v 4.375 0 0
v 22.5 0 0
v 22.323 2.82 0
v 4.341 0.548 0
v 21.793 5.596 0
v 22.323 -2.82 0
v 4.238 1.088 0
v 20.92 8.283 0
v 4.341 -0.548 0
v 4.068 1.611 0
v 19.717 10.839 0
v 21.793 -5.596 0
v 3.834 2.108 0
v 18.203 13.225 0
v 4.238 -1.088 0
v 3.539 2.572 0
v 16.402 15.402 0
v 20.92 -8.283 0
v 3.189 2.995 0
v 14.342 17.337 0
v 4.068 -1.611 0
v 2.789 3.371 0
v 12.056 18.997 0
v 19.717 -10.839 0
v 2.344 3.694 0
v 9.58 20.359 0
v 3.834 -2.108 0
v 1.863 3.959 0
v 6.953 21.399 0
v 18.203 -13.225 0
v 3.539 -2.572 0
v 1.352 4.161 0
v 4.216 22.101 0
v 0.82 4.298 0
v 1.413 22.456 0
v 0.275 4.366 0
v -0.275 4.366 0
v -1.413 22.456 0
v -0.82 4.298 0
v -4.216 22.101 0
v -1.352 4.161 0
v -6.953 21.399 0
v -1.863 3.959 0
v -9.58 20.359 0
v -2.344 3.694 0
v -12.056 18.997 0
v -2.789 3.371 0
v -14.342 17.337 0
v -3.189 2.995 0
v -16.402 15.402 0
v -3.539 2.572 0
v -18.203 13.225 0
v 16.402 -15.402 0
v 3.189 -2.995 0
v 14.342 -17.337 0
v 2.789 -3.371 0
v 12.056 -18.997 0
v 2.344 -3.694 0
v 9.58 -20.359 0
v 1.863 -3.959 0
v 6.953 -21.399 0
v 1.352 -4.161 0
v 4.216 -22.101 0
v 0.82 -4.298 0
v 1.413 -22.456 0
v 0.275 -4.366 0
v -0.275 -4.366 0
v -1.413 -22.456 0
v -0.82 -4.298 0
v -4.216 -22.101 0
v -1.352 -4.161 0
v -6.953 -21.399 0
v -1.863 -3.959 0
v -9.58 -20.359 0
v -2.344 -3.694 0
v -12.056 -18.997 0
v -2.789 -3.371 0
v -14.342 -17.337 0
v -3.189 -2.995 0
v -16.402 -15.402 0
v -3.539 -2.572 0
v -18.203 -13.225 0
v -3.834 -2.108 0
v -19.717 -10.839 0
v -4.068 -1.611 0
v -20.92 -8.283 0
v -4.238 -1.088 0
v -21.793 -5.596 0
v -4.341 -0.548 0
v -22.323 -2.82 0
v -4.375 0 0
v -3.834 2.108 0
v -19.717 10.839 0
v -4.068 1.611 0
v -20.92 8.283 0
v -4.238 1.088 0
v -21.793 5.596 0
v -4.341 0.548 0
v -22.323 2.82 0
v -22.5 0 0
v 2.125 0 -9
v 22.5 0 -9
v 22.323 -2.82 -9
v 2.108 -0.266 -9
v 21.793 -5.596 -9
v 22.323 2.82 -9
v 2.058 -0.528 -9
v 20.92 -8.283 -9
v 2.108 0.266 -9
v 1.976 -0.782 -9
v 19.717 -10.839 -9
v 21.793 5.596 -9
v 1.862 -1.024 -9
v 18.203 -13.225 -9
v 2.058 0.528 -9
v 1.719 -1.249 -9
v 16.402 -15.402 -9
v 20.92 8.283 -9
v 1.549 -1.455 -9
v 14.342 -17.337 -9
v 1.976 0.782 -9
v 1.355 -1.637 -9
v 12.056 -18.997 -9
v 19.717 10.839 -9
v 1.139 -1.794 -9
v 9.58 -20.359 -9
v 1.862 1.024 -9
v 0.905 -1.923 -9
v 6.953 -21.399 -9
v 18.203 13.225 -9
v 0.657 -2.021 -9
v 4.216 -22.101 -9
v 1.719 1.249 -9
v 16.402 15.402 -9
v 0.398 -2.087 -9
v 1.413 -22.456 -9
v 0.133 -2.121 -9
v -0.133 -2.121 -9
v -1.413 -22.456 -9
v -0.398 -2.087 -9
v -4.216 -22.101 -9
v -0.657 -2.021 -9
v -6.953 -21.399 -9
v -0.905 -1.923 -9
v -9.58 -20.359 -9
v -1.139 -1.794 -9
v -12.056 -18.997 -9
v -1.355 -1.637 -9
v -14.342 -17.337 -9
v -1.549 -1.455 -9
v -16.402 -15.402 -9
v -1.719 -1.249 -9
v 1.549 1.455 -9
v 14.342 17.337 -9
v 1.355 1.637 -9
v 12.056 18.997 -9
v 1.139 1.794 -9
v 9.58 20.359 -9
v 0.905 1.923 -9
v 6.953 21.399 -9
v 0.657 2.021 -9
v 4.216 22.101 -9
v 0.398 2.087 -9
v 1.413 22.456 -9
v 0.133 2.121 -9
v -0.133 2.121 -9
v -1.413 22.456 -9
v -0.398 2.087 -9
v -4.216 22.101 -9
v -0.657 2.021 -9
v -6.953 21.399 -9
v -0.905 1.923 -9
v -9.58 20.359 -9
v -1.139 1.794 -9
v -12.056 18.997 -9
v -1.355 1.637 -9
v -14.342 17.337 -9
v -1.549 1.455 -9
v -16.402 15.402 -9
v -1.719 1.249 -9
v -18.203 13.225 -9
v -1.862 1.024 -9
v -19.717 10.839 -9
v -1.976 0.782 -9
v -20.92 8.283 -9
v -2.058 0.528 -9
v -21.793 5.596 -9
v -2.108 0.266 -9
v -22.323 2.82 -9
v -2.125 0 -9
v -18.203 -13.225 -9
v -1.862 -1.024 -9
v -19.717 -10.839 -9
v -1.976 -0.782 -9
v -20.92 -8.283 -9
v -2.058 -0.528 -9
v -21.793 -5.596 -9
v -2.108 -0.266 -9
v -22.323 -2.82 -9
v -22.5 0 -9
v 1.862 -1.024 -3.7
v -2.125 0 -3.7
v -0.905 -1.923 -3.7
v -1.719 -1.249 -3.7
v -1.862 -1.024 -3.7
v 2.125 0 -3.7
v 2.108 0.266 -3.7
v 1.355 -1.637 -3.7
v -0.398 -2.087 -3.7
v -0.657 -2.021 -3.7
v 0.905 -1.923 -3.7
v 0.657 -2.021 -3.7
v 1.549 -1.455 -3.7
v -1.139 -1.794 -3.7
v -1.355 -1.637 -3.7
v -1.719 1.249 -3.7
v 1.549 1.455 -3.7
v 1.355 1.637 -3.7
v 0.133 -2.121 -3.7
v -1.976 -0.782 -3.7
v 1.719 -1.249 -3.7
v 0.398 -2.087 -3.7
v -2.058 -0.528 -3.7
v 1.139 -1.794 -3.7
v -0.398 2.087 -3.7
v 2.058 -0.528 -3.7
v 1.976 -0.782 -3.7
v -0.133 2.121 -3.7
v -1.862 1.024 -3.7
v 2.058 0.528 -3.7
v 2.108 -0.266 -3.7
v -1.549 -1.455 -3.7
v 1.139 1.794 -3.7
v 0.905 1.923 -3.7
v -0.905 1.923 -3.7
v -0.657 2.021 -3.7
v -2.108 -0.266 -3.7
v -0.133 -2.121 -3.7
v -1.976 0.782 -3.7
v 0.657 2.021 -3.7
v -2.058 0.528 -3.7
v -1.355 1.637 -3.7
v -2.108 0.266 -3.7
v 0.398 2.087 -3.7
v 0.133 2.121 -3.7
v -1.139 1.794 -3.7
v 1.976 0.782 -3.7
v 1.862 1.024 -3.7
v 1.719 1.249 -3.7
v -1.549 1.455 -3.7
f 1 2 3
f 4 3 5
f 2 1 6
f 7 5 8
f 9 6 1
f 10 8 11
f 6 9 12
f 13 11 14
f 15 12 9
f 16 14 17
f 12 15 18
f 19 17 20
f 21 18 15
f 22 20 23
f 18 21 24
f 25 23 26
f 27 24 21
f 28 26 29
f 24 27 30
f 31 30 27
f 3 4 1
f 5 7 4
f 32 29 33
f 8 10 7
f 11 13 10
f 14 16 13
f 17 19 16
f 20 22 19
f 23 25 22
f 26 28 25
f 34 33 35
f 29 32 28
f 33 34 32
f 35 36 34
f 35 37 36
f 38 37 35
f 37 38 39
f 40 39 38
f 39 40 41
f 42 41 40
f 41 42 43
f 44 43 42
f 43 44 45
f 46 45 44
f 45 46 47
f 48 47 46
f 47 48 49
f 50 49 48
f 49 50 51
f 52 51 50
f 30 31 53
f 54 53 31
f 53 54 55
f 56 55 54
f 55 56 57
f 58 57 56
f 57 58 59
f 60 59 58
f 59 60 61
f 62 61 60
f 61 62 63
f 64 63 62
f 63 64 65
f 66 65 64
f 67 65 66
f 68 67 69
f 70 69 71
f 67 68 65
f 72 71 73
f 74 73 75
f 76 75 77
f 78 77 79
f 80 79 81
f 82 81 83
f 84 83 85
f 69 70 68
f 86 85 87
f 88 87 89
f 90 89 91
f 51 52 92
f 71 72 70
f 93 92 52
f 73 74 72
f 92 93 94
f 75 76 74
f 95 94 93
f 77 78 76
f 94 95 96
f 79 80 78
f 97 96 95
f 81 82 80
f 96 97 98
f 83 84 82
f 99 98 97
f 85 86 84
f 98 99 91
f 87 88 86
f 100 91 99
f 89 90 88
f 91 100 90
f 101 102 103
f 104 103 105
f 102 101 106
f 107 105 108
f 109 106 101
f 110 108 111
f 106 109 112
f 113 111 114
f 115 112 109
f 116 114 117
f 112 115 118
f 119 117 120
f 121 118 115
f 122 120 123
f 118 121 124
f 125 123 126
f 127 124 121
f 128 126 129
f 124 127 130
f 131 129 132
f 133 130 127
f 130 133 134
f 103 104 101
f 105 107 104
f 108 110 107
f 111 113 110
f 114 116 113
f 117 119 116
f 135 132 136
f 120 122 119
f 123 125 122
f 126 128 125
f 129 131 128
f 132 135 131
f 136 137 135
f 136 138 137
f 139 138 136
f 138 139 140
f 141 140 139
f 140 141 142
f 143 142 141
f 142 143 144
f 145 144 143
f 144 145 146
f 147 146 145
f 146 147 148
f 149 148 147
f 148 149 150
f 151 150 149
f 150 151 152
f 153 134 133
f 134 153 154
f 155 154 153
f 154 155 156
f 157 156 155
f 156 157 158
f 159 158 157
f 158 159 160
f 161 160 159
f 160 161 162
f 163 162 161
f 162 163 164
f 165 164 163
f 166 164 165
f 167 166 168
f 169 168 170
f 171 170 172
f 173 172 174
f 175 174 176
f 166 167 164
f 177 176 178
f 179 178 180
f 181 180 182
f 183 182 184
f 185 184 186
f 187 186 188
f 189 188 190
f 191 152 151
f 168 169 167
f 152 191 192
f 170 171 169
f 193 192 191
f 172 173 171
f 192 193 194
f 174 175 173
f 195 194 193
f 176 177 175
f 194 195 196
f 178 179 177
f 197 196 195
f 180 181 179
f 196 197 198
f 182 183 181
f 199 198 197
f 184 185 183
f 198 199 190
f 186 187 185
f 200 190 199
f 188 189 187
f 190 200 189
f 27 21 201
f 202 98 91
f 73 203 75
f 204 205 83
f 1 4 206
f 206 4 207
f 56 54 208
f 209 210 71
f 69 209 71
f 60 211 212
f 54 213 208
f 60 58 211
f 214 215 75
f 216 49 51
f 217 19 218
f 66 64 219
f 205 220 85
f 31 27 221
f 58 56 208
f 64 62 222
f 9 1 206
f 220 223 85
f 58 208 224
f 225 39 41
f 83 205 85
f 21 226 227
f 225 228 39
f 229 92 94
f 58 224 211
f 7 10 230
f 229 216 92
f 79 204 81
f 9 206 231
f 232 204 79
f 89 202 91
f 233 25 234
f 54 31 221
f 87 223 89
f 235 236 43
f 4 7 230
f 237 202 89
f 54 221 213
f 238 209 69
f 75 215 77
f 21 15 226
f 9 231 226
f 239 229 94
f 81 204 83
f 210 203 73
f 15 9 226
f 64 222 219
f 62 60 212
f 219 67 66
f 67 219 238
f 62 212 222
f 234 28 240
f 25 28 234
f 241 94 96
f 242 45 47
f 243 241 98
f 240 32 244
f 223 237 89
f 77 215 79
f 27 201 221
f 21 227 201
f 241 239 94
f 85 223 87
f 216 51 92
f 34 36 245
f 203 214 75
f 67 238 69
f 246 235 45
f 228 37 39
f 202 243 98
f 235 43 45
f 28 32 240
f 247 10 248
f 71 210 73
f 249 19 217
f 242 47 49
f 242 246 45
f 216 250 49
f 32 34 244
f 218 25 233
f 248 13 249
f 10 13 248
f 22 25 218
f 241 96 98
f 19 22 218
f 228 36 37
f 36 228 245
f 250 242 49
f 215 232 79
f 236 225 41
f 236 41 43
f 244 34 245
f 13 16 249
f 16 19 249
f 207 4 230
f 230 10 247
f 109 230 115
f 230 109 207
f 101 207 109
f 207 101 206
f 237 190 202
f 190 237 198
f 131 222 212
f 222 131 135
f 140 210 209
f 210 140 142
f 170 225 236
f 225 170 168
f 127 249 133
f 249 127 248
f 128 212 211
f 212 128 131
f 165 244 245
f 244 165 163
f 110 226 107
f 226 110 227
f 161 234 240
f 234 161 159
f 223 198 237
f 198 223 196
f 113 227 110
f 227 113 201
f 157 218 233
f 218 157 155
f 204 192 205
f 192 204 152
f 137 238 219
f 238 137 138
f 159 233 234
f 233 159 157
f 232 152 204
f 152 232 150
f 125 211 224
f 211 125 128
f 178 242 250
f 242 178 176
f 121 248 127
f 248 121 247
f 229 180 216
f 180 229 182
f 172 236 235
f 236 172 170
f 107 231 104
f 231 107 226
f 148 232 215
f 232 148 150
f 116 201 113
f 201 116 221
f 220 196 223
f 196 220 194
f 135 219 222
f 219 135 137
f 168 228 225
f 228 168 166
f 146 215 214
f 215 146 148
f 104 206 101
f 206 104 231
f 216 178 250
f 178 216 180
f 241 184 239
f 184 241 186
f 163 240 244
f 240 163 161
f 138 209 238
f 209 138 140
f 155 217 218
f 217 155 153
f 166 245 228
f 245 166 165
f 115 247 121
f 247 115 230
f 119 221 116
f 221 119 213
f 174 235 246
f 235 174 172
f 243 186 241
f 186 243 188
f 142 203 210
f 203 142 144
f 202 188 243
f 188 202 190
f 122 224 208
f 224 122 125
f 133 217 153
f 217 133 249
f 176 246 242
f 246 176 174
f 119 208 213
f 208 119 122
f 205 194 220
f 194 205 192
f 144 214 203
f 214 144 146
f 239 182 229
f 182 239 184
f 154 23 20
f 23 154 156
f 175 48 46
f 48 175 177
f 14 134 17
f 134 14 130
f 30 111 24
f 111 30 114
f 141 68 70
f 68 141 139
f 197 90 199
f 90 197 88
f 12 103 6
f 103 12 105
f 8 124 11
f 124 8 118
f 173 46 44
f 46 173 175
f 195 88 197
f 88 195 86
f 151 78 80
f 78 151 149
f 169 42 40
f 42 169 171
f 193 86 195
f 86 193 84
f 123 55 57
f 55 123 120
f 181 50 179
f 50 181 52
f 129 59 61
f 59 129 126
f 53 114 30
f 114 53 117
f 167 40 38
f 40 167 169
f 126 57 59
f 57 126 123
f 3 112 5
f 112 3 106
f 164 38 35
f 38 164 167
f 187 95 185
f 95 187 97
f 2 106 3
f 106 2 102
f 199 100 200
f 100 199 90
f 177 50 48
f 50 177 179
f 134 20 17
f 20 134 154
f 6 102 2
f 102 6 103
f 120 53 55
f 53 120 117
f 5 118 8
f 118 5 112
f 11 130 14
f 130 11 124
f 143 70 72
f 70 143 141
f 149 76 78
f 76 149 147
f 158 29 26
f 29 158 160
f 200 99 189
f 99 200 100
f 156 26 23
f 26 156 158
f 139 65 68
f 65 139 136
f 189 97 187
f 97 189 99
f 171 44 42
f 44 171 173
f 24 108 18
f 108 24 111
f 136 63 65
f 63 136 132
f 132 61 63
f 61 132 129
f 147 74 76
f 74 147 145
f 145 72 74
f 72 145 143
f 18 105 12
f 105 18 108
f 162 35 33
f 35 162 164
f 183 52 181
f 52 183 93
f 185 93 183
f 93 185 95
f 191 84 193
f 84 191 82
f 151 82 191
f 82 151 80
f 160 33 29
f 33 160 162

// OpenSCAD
$fn = 50;


difference() {
	union() {
		translate(v = [0, 0, -9.0000000000]) {
			cylinder(h = 9, r = 22.5000000000);
		}
	}
	union() {
		translate(v = [0, 0, 0]) {
			rotate(a = [0, 0, 0]) {
				difference() {
					union() {
						#translate(v = [0, 0, -9.0000000000]) {
							cylinder(h = 9, r = 2.0000000000);
						}
						#translate(v = [0, 0, -3.7000000000]) {
							cylinder(h = 3.7000000000, r1 = 2.1250000000, r2 = 4.3750000000);
						}
						#translate(v = [0, 0, -9.0000000000]) {
							cylinder(h = 9, r = 2.1250000000);
						}
						#translate(v = [0, 0, -9.0000000000]) {
							cylinder(h = 9, r = 2.0000000000);
						}
					}
					union();
				}
			}
		}
	}
}
